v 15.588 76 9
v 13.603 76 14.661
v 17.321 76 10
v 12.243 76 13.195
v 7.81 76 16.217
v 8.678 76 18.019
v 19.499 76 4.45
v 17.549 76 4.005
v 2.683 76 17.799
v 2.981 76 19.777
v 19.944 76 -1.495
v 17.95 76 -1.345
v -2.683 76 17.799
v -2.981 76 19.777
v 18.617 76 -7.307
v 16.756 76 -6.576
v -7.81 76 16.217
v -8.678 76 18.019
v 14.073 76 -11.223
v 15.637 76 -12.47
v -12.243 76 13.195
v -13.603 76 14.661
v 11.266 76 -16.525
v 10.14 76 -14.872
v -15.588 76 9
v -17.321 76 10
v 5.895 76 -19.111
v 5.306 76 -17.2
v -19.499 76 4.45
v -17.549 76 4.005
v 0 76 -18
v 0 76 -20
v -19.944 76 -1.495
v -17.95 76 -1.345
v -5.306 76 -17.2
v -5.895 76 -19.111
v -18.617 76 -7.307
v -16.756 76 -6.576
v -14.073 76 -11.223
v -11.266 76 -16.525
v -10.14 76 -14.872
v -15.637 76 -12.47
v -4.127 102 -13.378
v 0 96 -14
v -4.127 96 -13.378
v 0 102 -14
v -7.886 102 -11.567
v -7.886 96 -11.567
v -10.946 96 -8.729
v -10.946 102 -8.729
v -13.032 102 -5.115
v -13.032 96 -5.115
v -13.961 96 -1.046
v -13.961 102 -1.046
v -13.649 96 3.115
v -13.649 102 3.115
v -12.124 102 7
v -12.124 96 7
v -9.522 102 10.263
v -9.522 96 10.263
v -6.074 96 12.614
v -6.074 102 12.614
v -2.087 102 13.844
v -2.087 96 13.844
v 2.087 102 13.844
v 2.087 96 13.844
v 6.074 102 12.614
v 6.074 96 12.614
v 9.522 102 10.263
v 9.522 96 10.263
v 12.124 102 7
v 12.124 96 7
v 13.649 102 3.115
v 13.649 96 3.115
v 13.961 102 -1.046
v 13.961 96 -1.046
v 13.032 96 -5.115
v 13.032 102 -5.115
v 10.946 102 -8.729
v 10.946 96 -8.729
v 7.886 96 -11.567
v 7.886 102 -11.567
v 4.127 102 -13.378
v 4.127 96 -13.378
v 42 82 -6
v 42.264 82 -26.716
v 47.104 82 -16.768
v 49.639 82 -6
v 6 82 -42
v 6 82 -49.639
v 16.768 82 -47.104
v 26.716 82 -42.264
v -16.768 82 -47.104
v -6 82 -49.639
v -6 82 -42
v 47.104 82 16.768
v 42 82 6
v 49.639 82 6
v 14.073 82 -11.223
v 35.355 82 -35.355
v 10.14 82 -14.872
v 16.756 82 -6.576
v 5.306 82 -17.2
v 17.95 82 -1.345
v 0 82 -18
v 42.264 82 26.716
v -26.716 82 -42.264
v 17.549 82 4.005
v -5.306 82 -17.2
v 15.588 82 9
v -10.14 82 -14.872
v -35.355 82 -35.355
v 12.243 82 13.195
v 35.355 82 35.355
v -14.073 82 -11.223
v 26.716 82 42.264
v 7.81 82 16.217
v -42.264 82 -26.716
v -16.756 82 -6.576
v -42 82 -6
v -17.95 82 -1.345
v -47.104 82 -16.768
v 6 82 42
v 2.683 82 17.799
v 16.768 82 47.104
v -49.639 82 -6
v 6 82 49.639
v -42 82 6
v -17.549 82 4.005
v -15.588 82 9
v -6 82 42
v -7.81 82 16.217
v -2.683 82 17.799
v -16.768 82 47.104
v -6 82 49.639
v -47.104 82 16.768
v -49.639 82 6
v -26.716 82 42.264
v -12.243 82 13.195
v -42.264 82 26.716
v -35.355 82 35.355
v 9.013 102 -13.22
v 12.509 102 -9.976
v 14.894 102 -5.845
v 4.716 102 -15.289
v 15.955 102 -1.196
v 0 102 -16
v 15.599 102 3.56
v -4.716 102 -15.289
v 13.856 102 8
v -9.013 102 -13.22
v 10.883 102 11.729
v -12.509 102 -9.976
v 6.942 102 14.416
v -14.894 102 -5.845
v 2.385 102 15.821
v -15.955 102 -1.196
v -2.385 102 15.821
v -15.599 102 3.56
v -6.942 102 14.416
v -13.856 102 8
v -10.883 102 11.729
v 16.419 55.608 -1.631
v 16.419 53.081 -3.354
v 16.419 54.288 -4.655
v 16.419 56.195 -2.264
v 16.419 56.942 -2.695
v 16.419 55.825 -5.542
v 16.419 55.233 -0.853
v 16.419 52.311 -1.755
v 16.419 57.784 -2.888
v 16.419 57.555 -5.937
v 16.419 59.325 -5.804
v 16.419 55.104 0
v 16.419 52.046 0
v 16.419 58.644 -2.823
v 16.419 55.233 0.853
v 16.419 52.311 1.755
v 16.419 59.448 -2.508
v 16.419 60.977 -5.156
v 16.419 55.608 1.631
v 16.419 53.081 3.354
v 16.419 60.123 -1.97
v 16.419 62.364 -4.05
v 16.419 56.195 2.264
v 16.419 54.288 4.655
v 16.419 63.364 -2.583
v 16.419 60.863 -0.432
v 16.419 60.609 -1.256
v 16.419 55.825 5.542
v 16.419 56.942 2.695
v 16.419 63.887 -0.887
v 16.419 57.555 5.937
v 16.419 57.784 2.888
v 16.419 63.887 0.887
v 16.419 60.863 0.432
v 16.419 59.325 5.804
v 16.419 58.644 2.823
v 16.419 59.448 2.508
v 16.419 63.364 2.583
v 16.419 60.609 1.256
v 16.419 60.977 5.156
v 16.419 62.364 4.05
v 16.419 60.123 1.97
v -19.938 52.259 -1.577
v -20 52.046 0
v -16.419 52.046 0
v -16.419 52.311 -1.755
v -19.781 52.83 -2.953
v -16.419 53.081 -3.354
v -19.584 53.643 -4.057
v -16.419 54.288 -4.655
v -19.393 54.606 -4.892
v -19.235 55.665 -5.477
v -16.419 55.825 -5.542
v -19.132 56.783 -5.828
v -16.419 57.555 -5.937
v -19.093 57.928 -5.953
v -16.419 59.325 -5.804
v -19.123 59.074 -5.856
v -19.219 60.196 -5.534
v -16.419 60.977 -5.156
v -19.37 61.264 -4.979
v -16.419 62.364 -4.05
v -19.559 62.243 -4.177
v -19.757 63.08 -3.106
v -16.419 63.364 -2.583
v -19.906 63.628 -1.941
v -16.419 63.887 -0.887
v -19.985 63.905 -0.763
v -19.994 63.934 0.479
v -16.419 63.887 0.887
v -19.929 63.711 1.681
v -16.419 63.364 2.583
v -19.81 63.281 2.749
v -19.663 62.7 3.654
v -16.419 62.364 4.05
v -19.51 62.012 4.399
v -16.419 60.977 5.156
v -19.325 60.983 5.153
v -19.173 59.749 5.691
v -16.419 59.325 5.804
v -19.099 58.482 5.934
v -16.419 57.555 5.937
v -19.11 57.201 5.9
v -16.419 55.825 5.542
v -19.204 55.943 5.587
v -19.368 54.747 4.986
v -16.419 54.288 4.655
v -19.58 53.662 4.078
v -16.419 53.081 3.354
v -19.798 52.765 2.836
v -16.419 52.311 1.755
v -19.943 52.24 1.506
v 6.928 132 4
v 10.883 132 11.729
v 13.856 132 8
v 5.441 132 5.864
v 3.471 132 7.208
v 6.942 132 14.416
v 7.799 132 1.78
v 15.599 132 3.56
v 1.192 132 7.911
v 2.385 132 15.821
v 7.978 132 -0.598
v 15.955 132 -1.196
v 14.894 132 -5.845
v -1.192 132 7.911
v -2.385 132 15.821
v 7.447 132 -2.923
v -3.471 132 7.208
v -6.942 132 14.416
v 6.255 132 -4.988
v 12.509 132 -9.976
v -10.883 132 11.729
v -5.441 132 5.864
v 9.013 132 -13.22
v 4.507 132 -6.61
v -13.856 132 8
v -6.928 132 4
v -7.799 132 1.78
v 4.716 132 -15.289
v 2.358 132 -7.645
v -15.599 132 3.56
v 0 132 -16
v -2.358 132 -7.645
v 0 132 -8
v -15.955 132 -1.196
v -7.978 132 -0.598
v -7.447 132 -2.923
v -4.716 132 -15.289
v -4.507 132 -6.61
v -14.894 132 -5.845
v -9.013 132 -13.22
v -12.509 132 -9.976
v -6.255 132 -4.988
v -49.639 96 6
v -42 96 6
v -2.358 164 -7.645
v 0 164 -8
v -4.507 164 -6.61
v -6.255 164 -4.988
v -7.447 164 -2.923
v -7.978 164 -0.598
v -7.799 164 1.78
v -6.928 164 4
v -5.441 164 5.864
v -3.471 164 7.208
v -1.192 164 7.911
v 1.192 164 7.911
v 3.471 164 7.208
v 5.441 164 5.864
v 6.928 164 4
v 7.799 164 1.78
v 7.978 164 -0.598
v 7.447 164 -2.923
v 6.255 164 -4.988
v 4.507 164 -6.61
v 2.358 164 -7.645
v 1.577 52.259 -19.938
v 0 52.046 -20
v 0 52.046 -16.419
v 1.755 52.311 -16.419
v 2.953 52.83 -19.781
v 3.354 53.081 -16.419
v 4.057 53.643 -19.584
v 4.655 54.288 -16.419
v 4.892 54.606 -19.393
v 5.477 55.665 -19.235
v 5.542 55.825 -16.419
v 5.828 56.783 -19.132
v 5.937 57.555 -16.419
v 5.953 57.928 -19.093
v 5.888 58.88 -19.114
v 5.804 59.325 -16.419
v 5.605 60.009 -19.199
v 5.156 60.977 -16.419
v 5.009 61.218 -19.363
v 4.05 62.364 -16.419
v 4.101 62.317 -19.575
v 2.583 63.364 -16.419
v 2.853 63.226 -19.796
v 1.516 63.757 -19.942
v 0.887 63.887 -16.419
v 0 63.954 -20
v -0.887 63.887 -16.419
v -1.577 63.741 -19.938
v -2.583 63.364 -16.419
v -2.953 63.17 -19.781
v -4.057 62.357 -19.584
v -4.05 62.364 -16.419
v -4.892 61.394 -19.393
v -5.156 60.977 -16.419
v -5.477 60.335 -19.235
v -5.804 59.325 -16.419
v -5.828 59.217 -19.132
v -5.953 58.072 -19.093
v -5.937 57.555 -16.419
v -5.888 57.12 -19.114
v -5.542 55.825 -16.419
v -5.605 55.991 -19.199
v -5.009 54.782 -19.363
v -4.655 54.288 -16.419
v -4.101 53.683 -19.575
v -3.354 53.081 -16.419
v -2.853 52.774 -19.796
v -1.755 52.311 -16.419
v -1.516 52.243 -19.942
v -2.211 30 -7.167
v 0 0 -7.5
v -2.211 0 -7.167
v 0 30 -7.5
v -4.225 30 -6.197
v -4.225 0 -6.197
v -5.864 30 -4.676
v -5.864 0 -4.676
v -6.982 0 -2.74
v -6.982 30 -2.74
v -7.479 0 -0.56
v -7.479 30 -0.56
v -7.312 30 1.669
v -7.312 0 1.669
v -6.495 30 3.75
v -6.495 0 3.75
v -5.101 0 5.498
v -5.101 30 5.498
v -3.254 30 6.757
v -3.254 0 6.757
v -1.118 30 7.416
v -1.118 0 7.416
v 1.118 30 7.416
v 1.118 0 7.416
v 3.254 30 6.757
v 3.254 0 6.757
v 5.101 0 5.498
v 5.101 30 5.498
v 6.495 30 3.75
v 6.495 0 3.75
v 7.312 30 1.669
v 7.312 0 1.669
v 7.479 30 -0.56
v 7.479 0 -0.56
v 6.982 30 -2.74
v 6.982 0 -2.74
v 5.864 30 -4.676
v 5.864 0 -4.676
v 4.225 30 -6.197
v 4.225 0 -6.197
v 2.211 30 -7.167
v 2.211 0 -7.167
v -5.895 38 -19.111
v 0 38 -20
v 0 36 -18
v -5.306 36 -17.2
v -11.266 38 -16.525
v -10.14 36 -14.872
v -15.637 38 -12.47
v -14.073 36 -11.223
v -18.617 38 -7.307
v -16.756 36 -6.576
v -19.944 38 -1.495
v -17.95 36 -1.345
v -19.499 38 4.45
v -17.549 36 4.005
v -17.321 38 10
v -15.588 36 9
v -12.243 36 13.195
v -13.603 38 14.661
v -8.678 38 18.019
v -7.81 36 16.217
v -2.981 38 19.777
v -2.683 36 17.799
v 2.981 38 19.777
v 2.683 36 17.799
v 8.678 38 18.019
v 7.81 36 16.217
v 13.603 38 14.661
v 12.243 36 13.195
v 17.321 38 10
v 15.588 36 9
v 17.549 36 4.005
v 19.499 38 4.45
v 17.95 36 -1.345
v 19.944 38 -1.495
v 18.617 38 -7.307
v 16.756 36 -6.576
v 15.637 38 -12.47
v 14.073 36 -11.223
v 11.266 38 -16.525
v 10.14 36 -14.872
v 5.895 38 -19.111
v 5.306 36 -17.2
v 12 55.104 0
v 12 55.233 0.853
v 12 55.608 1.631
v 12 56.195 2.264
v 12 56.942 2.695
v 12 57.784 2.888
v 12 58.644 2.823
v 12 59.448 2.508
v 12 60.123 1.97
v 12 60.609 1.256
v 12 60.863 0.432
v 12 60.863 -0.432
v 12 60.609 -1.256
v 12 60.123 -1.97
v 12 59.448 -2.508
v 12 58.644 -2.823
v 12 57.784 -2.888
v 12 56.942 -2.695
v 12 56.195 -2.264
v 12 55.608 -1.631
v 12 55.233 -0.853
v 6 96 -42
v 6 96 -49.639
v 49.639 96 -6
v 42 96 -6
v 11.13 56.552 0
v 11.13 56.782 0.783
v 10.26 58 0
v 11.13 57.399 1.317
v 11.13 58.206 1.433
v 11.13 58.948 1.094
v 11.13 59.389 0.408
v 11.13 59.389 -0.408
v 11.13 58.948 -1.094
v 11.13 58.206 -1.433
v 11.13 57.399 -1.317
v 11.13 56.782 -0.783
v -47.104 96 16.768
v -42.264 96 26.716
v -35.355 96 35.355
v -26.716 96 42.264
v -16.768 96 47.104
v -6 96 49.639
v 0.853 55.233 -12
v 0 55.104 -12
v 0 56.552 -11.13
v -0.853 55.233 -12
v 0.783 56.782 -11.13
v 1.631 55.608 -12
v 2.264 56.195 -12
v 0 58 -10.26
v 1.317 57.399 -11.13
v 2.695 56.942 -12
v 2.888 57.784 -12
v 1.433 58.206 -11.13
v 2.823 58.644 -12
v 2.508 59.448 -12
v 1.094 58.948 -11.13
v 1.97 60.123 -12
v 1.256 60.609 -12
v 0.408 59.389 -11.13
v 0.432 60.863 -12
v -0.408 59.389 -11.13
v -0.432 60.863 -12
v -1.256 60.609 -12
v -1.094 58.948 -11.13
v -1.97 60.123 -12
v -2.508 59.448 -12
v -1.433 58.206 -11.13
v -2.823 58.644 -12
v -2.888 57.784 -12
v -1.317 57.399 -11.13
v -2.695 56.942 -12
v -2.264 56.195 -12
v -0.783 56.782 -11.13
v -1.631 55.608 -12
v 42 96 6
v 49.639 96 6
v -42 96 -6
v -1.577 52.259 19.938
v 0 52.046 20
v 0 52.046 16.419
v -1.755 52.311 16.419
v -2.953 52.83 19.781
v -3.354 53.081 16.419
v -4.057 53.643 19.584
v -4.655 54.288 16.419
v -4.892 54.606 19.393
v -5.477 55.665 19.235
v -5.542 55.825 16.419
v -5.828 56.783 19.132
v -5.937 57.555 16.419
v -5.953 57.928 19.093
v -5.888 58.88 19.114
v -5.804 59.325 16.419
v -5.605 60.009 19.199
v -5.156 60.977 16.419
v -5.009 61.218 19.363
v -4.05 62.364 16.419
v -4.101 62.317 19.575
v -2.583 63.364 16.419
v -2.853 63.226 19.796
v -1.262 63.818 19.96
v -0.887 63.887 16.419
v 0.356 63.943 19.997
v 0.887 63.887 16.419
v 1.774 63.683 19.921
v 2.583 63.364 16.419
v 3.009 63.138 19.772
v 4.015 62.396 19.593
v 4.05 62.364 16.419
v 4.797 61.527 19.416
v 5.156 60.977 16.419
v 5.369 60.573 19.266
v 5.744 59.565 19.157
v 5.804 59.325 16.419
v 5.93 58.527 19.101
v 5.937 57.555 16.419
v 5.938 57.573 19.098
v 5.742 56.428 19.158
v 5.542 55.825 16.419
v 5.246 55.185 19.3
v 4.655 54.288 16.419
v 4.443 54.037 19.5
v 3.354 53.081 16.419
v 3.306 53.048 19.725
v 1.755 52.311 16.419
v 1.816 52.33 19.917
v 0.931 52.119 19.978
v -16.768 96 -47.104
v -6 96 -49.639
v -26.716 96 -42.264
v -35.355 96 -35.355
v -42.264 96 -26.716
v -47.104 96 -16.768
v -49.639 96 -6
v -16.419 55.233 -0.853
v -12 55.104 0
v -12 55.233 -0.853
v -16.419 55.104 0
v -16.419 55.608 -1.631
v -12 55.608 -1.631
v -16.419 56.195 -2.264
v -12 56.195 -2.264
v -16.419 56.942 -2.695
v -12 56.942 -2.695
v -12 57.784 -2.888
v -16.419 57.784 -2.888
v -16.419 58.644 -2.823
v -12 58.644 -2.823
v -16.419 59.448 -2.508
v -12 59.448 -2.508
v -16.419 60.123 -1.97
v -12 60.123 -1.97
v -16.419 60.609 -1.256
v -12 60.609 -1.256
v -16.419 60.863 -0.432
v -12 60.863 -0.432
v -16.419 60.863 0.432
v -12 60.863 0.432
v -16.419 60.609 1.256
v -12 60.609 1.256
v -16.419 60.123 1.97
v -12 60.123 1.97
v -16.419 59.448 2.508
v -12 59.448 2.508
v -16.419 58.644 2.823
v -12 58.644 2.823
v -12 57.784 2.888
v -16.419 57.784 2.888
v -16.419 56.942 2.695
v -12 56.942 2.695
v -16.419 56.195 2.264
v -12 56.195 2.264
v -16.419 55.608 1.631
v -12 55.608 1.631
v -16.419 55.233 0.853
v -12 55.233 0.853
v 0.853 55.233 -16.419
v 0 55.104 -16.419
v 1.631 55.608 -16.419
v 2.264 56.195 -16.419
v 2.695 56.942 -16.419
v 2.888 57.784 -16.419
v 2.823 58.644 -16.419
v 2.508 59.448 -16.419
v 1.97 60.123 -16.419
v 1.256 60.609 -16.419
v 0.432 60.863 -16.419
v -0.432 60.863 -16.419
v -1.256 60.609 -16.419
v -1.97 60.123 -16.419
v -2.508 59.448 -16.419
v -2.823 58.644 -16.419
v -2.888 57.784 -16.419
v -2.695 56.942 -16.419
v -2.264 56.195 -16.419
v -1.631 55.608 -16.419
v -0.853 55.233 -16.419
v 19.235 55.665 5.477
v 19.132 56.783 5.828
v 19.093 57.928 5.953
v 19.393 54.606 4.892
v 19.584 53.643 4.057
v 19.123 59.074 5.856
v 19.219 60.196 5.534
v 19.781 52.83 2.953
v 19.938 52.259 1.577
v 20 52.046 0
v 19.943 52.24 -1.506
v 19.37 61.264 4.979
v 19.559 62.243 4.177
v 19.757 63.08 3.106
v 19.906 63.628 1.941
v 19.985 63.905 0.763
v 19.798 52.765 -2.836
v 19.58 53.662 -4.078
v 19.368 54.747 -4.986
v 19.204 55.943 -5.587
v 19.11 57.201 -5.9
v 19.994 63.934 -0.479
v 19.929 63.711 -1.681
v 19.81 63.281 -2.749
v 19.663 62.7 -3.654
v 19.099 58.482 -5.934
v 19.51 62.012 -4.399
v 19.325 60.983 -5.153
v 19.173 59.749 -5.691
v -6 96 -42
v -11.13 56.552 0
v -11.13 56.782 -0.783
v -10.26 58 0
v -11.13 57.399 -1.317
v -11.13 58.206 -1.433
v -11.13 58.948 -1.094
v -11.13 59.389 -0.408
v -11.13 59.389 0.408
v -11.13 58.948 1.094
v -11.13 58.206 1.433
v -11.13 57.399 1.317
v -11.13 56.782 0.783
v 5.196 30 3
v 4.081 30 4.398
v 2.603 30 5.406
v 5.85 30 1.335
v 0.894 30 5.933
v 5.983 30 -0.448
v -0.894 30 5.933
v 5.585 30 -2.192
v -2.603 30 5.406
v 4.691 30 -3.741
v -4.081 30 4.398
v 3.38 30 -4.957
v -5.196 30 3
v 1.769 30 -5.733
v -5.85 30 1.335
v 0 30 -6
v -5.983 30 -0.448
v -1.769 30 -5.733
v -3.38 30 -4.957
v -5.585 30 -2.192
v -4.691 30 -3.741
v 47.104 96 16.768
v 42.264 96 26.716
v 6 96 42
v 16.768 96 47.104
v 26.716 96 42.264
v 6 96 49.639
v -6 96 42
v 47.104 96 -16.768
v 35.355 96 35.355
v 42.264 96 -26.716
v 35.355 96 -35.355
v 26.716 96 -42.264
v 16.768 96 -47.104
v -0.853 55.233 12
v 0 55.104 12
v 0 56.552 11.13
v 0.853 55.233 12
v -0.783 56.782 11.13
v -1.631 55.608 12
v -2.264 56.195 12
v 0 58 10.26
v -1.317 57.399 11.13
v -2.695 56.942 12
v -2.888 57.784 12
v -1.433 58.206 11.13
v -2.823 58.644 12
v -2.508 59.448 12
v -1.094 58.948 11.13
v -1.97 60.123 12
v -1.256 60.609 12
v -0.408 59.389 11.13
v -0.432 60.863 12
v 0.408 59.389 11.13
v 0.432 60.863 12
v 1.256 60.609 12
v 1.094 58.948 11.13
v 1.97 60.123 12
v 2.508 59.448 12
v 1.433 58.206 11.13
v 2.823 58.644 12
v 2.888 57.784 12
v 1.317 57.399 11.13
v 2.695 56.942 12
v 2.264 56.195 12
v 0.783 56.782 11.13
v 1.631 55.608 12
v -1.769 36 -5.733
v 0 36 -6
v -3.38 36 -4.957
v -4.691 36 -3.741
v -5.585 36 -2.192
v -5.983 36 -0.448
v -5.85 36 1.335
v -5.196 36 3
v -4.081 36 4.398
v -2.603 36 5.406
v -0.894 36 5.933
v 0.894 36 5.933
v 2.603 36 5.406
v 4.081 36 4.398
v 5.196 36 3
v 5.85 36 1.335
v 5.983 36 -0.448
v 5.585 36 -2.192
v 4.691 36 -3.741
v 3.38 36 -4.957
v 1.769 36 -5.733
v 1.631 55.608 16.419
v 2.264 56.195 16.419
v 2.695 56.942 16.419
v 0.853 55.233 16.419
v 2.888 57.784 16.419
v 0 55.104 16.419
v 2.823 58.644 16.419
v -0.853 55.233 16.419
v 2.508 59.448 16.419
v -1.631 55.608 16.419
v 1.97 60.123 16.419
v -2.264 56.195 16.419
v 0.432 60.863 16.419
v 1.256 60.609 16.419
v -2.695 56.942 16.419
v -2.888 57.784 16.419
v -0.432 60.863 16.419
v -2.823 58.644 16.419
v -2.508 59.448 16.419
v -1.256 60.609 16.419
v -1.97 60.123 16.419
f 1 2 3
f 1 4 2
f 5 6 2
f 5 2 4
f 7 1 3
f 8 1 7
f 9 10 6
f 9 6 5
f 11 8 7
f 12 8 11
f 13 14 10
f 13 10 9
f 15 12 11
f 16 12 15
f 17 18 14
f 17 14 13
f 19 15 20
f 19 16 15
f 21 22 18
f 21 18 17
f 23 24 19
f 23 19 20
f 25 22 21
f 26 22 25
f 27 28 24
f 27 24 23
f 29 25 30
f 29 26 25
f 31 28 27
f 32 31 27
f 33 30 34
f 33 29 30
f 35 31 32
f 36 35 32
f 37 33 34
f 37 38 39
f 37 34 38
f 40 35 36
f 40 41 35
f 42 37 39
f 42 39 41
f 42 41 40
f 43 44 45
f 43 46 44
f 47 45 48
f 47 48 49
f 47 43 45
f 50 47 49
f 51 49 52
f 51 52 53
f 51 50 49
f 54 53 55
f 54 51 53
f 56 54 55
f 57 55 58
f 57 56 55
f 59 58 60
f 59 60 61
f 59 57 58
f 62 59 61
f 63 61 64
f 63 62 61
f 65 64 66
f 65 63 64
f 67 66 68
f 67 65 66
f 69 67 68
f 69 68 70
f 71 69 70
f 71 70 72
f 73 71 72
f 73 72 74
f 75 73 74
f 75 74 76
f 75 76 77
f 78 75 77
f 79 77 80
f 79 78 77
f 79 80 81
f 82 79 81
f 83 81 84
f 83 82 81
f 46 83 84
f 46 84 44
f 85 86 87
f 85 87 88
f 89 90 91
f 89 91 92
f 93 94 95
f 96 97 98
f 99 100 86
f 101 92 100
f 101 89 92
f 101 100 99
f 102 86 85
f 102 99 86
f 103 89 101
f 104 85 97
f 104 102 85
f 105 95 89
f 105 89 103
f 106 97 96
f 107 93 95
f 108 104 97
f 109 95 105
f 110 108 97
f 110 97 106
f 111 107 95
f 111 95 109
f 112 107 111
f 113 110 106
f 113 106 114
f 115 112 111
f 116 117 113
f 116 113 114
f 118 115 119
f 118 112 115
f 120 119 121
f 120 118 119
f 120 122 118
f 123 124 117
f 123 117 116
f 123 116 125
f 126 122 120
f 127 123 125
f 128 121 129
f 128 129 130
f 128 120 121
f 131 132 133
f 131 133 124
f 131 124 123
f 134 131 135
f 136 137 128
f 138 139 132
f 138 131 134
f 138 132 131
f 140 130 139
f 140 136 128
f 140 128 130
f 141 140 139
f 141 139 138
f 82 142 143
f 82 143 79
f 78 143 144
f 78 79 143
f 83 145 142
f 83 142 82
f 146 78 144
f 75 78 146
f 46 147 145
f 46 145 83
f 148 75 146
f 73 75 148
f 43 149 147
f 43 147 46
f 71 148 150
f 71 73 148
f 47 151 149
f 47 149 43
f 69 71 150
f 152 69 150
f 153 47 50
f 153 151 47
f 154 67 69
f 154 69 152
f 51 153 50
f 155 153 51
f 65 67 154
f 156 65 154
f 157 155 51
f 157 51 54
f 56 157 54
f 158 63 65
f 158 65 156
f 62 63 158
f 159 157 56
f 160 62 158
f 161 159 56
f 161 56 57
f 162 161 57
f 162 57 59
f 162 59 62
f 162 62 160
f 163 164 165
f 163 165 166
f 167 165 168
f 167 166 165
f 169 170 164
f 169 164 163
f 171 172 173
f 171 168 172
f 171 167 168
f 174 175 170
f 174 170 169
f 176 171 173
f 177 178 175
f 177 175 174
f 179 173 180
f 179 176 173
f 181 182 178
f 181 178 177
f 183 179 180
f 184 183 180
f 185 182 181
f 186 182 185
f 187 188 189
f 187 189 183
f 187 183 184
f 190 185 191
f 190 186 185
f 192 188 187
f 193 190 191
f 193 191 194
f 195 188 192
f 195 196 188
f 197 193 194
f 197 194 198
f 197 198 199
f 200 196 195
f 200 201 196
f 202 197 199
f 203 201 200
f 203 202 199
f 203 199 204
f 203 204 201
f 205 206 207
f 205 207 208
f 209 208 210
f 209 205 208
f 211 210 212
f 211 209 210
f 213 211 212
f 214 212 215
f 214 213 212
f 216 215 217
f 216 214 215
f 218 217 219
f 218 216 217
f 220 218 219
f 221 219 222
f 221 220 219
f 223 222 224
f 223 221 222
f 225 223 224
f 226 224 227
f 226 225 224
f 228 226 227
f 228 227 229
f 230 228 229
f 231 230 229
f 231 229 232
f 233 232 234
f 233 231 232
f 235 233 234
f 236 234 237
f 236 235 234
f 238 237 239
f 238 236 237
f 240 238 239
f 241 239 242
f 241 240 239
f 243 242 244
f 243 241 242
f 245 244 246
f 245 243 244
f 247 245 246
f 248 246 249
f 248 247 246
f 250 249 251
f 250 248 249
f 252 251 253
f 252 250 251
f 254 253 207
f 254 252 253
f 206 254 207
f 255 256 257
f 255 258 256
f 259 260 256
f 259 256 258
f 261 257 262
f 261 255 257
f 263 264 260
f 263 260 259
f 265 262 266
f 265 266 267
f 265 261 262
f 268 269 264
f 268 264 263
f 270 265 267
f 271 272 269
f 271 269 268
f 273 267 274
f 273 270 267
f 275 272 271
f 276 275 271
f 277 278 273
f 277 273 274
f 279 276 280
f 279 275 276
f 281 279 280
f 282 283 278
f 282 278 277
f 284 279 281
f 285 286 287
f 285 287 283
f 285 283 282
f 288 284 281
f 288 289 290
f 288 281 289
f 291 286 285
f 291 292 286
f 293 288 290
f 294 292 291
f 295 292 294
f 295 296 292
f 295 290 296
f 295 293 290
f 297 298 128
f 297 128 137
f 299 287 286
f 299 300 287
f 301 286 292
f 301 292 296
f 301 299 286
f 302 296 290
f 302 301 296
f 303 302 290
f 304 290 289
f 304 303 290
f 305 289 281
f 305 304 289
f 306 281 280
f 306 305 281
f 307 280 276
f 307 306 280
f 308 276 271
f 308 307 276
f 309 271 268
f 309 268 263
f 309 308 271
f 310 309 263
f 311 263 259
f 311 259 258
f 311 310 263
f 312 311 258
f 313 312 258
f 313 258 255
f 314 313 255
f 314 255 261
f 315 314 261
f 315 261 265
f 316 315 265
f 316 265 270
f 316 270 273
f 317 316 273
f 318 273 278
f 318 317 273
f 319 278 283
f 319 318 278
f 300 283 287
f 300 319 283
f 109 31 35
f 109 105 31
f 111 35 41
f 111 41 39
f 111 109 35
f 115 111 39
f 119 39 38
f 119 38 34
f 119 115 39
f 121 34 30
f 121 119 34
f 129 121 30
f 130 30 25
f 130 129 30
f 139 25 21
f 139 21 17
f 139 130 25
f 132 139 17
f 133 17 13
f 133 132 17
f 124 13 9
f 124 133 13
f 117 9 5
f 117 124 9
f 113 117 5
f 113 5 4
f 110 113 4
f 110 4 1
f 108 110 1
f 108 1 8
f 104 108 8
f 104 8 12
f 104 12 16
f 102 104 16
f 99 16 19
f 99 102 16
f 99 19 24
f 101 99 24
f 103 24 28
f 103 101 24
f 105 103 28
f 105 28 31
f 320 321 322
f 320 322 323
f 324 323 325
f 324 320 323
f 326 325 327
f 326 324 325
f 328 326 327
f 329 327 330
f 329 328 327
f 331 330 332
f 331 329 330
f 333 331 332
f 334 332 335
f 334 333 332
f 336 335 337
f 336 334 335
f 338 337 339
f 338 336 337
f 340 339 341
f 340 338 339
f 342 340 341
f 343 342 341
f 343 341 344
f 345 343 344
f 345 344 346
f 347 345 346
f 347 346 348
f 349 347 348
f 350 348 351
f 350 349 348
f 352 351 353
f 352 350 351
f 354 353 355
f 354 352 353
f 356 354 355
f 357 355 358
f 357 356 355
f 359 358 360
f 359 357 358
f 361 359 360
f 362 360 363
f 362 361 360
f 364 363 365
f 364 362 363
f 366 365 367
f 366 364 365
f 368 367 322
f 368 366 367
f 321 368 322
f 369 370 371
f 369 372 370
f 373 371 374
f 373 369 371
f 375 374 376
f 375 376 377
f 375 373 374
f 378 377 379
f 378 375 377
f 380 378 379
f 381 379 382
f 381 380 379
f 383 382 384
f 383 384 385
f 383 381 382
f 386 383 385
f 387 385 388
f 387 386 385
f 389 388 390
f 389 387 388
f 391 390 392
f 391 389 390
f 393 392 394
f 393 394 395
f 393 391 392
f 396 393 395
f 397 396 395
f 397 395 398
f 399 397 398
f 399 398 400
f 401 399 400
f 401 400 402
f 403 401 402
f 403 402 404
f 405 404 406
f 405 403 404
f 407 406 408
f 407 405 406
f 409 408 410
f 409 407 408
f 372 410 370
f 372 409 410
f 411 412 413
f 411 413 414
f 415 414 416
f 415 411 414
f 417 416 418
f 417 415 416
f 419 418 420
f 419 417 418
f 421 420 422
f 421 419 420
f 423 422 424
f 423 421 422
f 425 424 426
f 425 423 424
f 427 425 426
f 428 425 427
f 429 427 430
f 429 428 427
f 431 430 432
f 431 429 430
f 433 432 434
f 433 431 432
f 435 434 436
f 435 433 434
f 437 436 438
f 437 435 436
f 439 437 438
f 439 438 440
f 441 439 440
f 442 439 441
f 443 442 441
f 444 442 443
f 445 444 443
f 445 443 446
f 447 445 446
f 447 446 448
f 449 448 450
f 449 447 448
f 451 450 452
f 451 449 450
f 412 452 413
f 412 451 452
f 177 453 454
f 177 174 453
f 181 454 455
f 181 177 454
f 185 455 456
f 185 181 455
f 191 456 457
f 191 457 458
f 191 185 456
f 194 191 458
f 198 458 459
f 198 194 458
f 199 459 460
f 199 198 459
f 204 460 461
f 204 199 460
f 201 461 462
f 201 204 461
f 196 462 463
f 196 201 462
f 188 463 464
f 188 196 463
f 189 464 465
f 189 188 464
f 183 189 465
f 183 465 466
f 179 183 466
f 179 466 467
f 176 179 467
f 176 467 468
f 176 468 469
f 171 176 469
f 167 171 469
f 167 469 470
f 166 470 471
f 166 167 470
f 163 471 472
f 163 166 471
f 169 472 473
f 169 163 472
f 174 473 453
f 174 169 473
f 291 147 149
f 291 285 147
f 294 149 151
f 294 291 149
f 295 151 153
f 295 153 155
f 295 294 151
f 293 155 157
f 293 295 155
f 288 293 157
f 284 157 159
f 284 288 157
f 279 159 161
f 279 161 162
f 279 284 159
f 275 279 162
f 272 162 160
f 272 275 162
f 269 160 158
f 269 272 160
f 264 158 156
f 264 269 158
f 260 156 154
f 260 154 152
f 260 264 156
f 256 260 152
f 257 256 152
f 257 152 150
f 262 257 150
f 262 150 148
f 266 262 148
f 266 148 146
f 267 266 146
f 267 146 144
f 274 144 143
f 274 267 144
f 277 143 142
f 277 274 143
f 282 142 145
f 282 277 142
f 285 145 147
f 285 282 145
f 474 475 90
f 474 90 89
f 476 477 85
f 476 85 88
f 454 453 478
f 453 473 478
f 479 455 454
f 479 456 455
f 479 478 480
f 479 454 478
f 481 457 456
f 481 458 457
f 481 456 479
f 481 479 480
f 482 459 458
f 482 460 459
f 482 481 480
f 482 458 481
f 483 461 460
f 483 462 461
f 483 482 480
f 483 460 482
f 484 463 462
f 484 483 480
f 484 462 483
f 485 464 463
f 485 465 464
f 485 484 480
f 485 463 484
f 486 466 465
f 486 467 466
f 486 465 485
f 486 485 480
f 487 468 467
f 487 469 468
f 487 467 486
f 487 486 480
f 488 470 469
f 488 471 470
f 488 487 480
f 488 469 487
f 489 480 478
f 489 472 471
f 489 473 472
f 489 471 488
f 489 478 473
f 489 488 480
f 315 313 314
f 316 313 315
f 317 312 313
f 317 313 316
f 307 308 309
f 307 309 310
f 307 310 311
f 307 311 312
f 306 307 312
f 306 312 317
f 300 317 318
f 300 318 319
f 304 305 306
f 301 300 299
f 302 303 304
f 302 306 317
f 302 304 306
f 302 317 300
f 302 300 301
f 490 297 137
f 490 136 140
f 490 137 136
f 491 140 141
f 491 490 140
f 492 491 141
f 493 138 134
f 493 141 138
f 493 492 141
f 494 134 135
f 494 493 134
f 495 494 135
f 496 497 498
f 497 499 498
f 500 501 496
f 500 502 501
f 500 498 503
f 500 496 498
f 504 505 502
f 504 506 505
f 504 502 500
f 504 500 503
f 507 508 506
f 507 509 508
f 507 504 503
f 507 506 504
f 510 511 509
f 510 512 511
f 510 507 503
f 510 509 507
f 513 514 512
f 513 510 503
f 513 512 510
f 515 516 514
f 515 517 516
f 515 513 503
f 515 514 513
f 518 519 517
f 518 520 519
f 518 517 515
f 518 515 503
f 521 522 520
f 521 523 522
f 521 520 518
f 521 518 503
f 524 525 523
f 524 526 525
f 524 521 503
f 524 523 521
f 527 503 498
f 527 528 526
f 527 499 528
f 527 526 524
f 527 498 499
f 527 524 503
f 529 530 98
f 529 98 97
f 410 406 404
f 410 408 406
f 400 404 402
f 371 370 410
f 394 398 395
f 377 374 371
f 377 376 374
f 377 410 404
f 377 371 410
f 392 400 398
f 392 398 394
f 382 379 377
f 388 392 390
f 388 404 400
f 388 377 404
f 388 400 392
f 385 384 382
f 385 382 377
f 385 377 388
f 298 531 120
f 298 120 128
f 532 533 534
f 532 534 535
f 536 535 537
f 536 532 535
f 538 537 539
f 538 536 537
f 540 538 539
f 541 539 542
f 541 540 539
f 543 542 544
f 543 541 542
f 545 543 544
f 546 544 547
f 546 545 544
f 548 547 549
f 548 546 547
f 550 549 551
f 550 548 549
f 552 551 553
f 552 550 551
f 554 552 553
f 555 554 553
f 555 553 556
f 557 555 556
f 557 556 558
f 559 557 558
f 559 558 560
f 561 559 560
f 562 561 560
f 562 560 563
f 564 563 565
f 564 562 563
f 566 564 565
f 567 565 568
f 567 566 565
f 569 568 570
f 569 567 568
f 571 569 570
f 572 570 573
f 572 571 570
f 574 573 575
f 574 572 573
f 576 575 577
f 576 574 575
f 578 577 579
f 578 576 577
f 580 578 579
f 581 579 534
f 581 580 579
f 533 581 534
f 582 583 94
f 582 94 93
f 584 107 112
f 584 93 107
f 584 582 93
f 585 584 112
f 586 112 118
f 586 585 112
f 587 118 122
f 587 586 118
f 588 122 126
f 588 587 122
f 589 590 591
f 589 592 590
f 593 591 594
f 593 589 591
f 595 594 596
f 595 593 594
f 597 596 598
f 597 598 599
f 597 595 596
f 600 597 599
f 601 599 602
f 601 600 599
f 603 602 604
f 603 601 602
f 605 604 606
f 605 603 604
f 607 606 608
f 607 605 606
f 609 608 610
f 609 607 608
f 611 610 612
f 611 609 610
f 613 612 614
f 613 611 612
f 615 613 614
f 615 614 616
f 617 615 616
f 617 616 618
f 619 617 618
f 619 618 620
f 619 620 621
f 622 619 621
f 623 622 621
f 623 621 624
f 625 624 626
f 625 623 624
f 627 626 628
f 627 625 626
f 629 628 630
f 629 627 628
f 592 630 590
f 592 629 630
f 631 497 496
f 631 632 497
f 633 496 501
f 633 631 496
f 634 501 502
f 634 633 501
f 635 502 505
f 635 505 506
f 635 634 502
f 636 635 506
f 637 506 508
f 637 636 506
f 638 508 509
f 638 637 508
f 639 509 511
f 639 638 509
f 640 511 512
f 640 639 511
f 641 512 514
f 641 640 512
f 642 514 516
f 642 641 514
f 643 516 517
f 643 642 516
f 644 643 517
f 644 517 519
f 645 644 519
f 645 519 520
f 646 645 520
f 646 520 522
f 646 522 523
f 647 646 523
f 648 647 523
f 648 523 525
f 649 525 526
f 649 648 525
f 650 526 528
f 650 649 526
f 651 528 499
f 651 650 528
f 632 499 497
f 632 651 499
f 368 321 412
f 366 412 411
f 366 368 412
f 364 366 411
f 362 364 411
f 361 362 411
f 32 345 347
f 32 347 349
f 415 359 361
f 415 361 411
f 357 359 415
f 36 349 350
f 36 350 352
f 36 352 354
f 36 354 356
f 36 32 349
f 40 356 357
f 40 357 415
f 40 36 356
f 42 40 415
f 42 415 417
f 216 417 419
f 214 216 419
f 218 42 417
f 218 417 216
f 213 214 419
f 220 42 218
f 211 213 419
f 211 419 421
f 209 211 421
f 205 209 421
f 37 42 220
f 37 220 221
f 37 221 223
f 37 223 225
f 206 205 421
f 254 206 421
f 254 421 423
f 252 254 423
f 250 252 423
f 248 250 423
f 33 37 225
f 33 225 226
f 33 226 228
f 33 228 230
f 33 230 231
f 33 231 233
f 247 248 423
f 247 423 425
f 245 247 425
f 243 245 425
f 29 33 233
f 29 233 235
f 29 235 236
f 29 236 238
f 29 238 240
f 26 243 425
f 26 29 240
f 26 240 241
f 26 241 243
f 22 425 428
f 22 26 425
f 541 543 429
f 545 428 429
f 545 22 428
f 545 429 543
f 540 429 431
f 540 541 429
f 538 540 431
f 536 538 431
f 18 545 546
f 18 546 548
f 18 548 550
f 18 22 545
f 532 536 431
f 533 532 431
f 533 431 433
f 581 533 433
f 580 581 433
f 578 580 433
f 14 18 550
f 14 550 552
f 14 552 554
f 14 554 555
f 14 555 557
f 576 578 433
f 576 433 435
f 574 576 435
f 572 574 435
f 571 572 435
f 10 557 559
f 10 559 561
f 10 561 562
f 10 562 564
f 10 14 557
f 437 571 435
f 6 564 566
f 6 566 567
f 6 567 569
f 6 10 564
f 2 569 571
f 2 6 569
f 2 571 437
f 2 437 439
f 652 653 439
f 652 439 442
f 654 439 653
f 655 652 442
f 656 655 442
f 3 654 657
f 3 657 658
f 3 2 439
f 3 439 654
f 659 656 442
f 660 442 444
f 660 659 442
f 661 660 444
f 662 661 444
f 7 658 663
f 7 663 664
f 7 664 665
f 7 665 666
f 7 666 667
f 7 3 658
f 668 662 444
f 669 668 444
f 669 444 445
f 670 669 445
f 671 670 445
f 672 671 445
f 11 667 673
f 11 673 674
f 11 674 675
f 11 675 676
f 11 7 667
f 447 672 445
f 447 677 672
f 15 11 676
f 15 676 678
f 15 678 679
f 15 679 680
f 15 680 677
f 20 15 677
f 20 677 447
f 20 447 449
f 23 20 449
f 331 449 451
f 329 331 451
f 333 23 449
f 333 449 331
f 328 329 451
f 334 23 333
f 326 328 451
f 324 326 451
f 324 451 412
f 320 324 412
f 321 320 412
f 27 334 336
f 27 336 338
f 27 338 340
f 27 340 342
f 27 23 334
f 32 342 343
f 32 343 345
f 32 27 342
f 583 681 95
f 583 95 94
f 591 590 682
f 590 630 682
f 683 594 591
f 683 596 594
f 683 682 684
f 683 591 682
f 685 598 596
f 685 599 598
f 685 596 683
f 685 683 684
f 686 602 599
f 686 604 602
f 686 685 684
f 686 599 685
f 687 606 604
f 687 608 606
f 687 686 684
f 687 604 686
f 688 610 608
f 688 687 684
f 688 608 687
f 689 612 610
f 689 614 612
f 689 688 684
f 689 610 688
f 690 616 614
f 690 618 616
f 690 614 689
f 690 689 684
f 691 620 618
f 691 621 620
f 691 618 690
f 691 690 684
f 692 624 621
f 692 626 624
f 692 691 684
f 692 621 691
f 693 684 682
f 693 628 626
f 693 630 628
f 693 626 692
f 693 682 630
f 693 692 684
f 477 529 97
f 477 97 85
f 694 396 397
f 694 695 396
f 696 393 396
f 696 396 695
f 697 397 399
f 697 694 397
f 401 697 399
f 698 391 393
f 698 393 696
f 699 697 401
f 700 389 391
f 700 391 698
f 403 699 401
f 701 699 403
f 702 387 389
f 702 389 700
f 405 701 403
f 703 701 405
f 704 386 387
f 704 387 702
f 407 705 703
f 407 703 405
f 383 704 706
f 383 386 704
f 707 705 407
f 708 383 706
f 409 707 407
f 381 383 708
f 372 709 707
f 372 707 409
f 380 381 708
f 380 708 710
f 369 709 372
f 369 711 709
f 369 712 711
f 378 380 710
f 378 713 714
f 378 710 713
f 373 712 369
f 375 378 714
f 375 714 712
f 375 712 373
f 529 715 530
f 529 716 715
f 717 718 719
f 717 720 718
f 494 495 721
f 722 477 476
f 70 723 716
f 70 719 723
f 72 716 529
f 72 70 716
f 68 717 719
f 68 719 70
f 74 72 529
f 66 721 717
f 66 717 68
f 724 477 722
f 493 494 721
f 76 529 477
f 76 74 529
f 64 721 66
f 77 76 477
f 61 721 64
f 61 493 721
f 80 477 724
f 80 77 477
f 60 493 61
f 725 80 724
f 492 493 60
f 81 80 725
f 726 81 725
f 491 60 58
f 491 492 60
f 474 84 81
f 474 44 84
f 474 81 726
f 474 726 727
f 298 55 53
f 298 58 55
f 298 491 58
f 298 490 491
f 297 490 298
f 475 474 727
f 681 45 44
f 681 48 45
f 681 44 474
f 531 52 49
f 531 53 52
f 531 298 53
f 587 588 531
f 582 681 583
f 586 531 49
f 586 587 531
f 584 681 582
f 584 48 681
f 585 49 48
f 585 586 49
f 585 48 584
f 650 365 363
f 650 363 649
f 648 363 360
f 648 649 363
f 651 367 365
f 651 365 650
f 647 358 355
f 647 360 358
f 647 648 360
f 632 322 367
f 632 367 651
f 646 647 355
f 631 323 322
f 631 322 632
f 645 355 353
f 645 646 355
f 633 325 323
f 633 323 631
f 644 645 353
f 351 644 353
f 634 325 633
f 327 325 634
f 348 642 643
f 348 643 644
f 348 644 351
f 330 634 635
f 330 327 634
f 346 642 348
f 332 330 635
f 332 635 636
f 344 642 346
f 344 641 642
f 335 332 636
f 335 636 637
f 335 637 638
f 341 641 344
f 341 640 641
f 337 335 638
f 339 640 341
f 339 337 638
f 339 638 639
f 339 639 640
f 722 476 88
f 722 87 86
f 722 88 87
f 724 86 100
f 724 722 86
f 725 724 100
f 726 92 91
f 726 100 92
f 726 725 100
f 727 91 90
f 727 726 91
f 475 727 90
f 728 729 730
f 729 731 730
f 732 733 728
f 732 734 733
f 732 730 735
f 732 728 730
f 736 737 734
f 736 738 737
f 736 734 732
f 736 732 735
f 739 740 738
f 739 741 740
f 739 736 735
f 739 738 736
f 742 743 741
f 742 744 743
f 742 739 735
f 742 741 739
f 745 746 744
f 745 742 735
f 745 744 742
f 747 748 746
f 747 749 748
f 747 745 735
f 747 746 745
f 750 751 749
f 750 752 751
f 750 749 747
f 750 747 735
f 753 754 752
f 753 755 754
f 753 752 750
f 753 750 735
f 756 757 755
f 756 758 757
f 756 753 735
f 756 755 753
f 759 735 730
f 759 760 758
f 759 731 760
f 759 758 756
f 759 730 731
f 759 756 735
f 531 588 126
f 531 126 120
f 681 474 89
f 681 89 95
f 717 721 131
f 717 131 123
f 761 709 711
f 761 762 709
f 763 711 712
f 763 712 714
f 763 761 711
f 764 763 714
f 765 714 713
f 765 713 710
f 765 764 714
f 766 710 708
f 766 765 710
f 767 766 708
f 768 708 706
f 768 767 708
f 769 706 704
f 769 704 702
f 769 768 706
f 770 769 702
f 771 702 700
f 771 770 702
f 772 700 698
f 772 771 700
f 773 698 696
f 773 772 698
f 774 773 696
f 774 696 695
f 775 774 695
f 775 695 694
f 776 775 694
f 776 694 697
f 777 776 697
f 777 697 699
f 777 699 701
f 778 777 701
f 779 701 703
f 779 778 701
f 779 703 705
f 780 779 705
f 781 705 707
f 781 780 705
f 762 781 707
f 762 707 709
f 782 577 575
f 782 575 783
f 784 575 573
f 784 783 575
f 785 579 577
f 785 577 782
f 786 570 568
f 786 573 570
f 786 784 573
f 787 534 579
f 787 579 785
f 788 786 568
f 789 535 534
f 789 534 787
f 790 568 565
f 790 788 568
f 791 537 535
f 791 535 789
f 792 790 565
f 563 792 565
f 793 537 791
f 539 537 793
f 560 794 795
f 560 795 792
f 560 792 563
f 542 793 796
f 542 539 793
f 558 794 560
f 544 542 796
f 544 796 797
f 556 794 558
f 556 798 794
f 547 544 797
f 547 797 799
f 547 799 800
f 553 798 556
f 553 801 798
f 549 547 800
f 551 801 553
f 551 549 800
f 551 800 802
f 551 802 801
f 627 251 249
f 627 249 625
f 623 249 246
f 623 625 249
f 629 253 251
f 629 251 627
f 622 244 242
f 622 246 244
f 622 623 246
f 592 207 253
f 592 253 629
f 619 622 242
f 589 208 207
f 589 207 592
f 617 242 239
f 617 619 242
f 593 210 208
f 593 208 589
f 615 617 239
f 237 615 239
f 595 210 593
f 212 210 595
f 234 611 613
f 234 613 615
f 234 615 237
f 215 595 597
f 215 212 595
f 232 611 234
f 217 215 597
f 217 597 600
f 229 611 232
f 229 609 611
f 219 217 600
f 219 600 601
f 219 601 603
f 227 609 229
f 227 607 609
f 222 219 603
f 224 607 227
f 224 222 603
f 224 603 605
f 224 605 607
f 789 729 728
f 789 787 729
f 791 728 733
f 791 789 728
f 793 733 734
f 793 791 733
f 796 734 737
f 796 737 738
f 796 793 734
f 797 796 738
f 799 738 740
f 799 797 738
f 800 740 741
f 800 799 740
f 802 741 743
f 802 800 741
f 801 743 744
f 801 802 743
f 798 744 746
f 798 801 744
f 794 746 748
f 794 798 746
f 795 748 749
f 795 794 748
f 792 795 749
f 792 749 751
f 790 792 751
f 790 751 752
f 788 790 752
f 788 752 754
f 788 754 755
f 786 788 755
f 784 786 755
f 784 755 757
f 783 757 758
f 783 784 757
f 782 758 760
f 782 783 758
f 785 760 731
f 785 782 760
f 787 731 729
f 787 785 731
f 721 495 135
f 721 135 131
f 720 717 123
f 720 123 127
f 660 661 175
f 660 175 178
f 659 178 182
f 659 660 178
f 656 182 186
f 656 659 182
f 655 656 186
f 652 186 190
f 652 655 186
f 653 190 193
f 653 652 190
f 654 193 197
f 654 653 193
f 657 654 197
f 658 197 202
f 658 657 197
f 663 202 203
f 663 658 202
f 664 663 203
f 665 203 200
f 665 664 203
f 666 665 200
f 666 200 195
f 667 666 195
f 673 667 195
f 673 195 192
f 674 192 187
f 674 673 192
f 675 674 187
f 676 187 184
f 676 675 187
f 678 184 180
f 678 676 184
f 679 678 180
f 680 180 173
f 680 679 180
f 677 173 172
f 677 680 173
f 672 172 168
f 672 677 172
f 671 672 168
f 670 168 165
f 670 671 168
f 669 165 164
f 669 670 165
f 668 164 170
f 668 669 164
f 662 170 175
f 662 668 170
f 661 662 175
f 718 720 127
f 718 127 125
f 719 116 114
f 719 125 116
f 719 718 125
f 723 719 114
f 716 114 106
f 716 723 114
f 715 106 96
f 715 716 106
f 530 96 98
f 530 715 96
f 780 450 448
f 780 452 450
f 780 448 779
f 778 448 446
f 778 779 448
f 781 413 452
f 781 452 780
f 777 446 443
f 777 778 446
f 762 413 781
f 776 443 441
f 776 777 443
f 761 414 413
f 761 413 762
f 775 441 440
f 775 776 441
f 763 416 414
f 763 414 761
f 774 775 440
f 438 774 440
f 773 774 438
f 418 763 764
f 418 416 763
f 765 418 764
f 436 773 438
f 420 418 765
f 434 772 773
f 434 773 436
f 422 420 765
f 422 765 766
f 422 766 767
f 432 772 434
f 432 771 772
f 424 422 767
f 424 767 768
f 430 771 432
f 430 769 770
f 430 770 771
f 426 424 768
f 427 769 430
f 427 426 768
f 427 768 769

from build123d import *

# Parameters (mm, degrees)
CUT_EXTRUDE1_DEPTH = 14
CIRPATTERN1_COUNT  = 4
CIRPATTERN2_COUNT  = 4
CHAMFER3_SIZE      = 2


with BuildPart() as part:
    # Sketch1 → Revolve1 (revolve)
    with BuildSketch(Plane.XY, mode=Mode.PRIVATE) as revolve1_sk:
        Polygon((7.5, 0), (7.5, 30), (6, 30), (6, 36), (20, 36), (20, 76), (18, 76), (18, 82), (50, 82), (50, 96), (14, 96), (14, 102), (16, 102), (16, 132), (8, 132), (8, 164), (0, 164), (0, 0), align=None)
    revolve(revolve1_sk.sketch.rotate(Axis((0, 0, 0), (0, 1, 0)), 90), axis=Axis((0, 0, 0), (0, 1, 0)))  # turned: the seam where the file's is

    # Sketch2 → Cut-Extrude1 (cut)
    with BuildSketch(Plane(origin=(0, 96, 0), x_dir=(1, 0, 0), z_dir=(0, 1, 0))):
        with BuildLine():
            Line((42, 6), (49.638694584, 6))
            ThreePointArc((49.638694584, 6), (50, 0), (49.638694584, -6))
            Line((49.638694584, -6), (42, -6))
            Line((42, -6), (42, 6))
        make_face()
    cut_extrude1 = extrude(amount=-CUT_EXTRUDE1_DEPTH, mode=Mode.SUBTRACT)

    # CirPattern1: Cut-Extrude1 ×4 about axis
    cirpattern1_axis = Axis((0, 0, 0), (0, 1, 0))
    for i in range(1, CIRPATTERN1_COUNT):
        add(cut_extrude1.rotate(cirpattern1_axis, i * 360 / CIRPATTERN1_COUNT), mode=Mode.SUBTRACT)

    # Sketch6 → CBORE for #12 Binding Head Machine Screw3 (revolve, cut)
    with BuildSketch(Plane(origin=(0, 58, 20), x_dir=(0, -1, 0), z_dir=(1, 0, 0))):
        Polygon((0, 0), (0, 9.739852008), (2.8956, 8), (2.8956, 3.5814), (5.95376, 3.5814), (5.95376, 0), align=None)
    cbore_for_12_binding_head_machine_screw = revolve(axis=Axis((0, 58, 26.35), (0, 0, -1)), mode=Mode.SUBTRACT)

    # CirPattern2: CBORE for #12 Binding Head Machine Screw3 ×4 about axis
    cirpattern2_axis = Axis((0, 0, 0), (0, 1, 0))
    for i in range(1, CIRPATTERN2_COUNT):
        add(cbore_for_12_binding_head_machine_screw.rotate(cirpattern2_axis, i * 360 / CIRPATTERN2_COUNT), mode=Mode.SUBTRACT)

    # Chamfer3
    chamfer3_edges = [part.edges().sort_by_distance(p)[0] for p in [
        (0, 36, 20),
    ]]
    chamfer(chamfer3_edges, length=CHAMFER3_SIZE)


solid = part.part
